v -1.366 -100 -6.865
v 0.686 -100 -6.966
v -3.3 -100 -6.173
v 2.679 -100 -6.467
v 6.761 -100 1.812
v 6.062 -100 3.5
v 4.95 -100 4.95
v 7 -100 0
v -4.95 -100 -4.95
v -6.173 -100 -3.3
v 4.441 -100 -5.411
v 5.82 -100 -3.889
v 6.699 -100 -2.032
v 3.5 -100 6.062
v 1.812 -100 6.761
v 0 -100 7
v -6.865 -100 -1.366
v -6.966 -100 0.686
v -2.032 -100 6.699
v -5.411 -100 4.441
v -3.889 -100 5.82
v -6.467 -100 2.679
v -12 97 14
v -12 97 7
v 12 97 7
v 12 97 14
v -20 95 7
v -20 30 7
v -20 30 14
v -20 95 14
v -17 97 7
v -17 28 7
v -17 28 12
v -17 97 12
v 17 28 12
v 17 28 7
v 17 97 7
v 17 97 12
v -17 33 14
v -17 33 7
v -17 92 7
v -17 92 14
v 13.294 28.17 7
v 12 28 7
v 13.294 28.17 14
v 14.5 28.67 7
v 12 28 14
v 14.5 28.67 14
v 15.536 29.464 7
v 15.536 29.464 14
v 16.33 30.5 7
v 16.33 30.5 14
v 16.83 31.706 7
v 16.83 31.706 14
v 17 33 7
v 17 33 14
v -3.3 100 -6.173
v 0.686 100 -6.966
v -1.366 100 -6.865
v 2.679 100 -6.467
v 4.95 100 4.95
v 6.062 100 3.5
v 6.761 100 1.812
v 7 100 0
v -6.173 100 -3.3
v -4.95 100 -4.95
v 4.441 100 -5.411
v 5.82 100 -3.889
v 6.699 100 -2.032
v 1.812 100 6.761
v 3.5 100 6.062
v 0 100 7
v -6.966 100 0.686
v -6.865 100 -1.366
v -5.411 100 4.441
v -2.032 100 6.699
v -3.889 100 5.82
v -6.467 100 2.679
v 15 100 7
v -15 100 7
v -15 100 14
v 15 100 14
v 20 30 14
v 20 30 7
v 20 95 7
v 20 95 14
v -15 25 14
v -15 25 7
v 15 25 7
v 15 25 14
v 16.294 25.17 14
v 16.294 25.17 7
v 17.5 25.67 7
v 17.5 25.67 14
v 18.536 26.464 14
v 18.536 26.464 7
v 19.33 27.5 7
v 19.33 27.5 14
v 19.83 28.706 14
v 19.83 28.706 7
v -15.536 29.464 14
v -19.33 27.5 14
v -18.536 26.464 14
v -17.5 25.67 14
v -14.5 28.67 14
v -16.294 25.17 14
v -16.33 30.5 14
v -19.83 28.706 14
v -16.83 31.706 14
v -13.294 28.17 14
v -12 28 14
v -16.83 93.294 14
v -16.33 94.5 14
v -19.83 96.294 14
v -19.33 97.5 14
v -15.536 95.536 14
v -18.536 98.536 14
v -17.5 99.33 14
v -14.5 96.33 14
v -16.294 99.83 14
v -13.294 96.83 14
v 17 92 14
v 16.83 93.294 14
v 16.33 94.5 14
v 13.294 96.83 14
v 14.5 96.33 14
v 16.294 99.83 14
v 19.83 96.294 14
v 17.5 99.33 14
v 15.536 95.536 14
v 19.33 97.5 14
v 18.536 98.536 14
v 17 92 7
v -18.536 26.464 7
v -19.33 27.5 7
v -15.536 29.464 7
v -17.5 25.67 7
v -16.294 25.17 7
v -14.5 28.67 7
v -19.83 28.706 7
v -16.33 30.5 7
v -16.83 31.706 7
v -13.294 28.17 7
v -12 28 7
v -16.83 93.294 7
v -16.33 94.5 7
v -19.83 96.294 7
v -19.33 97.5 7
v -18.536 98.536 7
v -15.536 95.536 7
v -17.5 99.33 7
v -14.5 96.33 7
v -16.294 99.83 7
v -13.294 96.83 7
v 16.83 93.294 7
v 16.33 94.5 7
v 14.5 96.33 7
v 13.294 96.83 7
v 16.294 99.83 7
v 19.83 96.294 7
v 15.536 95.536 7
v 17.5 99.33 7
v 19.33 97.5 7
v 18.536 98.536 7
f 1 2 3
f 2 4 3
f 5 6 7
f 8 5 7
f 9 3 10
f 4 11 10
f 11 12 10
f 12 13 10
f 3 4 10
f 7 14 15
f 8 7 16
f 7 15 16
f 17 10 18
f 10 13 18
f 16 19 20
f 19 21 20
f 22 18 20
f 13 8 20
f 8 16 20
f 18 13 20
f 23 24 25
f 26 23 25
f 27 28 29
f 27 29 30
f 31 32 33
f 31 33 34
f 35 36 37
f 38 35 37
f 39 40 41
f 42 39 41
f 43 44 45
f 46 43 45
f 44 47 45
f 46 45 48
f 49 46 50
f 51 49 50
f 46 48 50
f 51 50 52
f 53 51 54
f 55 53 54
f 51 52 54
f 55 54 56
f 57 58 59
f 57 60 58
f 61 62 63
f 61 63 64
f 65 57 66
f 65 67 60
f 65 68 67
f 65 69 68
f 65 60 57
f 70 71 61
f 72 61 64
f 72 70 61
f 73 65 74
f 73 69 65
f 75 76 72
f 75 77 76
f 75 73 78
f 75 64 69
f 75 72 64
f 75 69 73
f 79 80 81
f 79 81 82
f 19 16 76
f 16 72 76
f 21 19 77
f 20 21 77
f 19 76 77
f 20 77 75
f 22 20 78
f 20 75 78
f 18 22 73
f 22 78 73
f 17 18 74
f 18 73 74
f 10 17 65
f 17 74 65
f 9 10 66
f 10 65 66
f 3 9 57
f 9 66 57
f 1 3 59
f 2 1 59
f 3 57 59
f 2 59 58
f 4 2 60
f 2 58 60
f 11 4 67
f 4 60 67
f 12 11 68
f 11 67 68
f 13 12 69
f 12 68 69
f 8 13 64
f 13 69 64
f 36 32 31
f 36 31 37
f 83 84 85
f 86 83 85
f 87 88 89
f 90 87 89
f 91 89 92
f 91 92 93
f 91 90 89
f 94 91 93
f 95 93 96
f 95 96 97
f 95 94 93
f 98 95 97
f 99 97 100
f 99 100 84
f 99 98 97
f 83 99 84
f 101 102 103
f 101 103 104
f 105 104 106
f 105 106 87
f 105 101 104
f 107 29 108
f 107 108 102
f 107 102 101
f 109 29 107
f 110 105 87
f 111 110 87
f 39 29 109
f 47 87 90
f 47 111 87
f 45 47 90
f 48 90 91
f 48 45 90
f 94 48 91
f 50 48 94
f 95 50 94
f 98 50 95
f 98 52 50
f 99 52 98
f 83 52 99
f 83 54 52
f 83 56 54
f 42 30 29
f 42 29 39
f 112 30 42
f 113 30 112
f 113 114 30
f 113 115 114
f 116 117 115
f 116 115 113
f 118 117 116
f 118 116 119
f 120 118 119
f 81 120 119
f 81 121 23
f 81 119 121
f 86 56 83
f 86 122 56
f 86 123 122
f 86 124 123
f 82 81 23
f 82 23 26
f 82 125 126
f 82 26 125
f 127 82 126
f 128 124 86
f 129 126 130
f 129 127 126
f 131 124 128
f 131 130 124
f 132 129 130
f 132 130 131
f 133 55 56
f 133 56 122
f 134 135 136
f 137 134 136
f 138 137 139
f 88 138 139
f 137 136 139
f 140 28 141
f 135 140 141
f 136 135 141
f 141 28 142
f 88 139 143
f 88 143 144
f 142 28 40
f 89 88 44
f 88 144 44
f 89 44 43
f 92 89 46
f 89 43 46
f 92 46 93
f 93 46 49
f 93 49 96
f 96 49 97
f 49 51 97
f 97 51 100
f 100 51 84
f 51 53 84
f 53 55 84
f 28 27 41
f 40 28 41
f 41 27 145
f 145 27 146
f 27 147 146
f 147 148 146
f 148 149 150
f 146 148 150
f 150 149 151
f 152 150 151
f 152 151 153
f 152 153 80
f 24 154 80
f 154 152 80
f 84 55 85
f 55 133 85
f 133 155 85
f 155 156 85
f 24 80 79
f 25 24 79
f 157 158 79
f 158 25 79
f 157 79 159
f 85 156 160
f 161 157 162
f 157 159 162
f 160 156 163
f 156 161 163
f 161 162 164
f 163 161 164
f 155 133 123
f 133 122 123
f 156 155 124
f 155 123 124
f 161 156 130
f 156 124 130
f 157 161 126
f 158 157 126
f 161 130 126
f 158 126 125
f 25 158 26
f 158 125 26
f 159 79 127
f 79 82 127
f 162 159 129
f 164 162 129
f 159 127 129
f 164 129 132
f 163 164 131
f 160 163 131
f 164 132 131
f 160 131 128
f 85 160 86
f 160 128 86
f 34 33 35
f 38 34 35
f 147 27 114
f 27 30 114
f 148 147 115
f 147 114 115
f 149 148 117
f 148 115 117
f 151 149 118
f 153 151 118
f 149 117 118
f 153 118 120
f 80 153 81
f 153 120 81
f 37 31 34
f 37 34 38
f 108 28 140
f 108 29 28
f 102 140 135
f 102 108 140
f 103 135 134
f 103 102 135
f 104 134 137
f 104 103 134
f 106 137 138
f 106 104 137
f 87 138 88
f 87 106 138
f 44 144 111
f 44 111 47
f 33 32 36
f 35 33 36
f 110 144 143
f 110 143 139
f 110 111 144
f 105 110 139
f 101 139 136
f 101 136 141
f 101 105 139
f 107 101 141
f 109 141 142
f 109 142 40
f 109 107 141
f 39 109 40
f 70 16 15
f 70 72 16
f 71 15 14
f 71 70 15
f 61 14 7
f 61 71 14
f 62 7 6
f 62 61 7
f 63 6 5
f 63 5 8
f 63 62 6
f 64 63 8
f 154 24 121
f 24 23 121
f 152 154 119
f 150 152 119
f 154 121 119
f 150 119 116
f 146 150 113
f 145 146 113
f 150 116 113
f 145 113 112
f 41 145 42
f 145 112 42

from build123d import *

# Parameters (mm, degrees)
F0_W     = 7
F0_H     = 200
F1_DEPTH = 7
F3_R     = 6.99999
F5_W     = 34
F5_H     = 69
F6_DEPTH = 5
F5_W_2   = 40
F5_H_2   = 75
F7_DEPTH = 7
F8_R     = 5
F9_R     = 5
F10_R    = 5
F11_R    = 5


# Not quite as in the source:
# - a fillet or chamfer is up to 0.001 mm smaller than in the source, because OpenCascade refuses the exact size


with BuildPart() as f1:
    # F0 (on Top) → F1 (new body)
    with BuildSketch(Plane.XY):
        with Locations((3.5, 0)):
            Rectangle(F0_W, F0_H)
    extrude(amount=F1_DEPTH)

    # F0 (on Top) → F2 (revolve)
    with BuildSketch(Plane.XY):
        with Locations((3.5, 0)):
            Rectangle(F0_W, F0_H)
    revolve(axis=Axis((0, 0, 0), (0, -1, 0)))

    # F3 (radius 7 in the source; OpenCascade refuses exactly that, so slightly less here)
    f3_edges = [f1.edges().sort_by_distance(p)[0] for p in [
        (7, 0, 7),
    ]]
    fillet(f3_edges, radius=F3_R)


with BuildPart() as f6:
    # F5 (on offset) → F6 (new body)
    with BuildSketch(Plane.XY.offset(7)):
        with Locations((0, 62.5)):
            Rectangle(F5_W, F5_H)
    extrude(amount=F6_DEPTH)


with BuildPart() as f7:
    # F5 (on offset) → F7 (new body)
    with BuildSketch(Plane.XY.offset(7)):
        with Locations((0, 62.5)):
            Rectangle(F5_W_2, F5_H_2)
        with Locations((0, 62.5)):
            Rectangle(F5_W, F5_H, mode=Mode.SUBTRACT)
    extrude(amount=F7_DEPTH)

    # F8
    f8_edges = [f7.edges().sort_by_distance(p)[0] for p in [
        (-17, 97, 10.5),
        (17, 28, 10.5),
        (-17, 28, 10.5),
    ]]
    fillet(f8_edges, radius=F8_R)

    # F9
    f9_edges = [f7.edges().sort_by_distance(p)[0] for p in [
        (17, 97, 10.5),
    ]]
    fillet(f9_edges, radius=F9_R)

    # F10
    f10_edges = [f7.edges().sort_by_distance(p)[0] for p in [
        (-20, 25, 10.5),
        (20, 25, 10.5),
    ]]
    fillet(f10_edges, radius=F10_R)

    # F11
    f11_edges = [f7.edges().sort_by_distance(p)[0] for p in [
        (20, 100, 10.5),
        (-20, 100, 10.5),
    ]]
    fillet(f11_edges, radius=F11_R)


solid = Compound([f1.part, f6.part, f7.part])
